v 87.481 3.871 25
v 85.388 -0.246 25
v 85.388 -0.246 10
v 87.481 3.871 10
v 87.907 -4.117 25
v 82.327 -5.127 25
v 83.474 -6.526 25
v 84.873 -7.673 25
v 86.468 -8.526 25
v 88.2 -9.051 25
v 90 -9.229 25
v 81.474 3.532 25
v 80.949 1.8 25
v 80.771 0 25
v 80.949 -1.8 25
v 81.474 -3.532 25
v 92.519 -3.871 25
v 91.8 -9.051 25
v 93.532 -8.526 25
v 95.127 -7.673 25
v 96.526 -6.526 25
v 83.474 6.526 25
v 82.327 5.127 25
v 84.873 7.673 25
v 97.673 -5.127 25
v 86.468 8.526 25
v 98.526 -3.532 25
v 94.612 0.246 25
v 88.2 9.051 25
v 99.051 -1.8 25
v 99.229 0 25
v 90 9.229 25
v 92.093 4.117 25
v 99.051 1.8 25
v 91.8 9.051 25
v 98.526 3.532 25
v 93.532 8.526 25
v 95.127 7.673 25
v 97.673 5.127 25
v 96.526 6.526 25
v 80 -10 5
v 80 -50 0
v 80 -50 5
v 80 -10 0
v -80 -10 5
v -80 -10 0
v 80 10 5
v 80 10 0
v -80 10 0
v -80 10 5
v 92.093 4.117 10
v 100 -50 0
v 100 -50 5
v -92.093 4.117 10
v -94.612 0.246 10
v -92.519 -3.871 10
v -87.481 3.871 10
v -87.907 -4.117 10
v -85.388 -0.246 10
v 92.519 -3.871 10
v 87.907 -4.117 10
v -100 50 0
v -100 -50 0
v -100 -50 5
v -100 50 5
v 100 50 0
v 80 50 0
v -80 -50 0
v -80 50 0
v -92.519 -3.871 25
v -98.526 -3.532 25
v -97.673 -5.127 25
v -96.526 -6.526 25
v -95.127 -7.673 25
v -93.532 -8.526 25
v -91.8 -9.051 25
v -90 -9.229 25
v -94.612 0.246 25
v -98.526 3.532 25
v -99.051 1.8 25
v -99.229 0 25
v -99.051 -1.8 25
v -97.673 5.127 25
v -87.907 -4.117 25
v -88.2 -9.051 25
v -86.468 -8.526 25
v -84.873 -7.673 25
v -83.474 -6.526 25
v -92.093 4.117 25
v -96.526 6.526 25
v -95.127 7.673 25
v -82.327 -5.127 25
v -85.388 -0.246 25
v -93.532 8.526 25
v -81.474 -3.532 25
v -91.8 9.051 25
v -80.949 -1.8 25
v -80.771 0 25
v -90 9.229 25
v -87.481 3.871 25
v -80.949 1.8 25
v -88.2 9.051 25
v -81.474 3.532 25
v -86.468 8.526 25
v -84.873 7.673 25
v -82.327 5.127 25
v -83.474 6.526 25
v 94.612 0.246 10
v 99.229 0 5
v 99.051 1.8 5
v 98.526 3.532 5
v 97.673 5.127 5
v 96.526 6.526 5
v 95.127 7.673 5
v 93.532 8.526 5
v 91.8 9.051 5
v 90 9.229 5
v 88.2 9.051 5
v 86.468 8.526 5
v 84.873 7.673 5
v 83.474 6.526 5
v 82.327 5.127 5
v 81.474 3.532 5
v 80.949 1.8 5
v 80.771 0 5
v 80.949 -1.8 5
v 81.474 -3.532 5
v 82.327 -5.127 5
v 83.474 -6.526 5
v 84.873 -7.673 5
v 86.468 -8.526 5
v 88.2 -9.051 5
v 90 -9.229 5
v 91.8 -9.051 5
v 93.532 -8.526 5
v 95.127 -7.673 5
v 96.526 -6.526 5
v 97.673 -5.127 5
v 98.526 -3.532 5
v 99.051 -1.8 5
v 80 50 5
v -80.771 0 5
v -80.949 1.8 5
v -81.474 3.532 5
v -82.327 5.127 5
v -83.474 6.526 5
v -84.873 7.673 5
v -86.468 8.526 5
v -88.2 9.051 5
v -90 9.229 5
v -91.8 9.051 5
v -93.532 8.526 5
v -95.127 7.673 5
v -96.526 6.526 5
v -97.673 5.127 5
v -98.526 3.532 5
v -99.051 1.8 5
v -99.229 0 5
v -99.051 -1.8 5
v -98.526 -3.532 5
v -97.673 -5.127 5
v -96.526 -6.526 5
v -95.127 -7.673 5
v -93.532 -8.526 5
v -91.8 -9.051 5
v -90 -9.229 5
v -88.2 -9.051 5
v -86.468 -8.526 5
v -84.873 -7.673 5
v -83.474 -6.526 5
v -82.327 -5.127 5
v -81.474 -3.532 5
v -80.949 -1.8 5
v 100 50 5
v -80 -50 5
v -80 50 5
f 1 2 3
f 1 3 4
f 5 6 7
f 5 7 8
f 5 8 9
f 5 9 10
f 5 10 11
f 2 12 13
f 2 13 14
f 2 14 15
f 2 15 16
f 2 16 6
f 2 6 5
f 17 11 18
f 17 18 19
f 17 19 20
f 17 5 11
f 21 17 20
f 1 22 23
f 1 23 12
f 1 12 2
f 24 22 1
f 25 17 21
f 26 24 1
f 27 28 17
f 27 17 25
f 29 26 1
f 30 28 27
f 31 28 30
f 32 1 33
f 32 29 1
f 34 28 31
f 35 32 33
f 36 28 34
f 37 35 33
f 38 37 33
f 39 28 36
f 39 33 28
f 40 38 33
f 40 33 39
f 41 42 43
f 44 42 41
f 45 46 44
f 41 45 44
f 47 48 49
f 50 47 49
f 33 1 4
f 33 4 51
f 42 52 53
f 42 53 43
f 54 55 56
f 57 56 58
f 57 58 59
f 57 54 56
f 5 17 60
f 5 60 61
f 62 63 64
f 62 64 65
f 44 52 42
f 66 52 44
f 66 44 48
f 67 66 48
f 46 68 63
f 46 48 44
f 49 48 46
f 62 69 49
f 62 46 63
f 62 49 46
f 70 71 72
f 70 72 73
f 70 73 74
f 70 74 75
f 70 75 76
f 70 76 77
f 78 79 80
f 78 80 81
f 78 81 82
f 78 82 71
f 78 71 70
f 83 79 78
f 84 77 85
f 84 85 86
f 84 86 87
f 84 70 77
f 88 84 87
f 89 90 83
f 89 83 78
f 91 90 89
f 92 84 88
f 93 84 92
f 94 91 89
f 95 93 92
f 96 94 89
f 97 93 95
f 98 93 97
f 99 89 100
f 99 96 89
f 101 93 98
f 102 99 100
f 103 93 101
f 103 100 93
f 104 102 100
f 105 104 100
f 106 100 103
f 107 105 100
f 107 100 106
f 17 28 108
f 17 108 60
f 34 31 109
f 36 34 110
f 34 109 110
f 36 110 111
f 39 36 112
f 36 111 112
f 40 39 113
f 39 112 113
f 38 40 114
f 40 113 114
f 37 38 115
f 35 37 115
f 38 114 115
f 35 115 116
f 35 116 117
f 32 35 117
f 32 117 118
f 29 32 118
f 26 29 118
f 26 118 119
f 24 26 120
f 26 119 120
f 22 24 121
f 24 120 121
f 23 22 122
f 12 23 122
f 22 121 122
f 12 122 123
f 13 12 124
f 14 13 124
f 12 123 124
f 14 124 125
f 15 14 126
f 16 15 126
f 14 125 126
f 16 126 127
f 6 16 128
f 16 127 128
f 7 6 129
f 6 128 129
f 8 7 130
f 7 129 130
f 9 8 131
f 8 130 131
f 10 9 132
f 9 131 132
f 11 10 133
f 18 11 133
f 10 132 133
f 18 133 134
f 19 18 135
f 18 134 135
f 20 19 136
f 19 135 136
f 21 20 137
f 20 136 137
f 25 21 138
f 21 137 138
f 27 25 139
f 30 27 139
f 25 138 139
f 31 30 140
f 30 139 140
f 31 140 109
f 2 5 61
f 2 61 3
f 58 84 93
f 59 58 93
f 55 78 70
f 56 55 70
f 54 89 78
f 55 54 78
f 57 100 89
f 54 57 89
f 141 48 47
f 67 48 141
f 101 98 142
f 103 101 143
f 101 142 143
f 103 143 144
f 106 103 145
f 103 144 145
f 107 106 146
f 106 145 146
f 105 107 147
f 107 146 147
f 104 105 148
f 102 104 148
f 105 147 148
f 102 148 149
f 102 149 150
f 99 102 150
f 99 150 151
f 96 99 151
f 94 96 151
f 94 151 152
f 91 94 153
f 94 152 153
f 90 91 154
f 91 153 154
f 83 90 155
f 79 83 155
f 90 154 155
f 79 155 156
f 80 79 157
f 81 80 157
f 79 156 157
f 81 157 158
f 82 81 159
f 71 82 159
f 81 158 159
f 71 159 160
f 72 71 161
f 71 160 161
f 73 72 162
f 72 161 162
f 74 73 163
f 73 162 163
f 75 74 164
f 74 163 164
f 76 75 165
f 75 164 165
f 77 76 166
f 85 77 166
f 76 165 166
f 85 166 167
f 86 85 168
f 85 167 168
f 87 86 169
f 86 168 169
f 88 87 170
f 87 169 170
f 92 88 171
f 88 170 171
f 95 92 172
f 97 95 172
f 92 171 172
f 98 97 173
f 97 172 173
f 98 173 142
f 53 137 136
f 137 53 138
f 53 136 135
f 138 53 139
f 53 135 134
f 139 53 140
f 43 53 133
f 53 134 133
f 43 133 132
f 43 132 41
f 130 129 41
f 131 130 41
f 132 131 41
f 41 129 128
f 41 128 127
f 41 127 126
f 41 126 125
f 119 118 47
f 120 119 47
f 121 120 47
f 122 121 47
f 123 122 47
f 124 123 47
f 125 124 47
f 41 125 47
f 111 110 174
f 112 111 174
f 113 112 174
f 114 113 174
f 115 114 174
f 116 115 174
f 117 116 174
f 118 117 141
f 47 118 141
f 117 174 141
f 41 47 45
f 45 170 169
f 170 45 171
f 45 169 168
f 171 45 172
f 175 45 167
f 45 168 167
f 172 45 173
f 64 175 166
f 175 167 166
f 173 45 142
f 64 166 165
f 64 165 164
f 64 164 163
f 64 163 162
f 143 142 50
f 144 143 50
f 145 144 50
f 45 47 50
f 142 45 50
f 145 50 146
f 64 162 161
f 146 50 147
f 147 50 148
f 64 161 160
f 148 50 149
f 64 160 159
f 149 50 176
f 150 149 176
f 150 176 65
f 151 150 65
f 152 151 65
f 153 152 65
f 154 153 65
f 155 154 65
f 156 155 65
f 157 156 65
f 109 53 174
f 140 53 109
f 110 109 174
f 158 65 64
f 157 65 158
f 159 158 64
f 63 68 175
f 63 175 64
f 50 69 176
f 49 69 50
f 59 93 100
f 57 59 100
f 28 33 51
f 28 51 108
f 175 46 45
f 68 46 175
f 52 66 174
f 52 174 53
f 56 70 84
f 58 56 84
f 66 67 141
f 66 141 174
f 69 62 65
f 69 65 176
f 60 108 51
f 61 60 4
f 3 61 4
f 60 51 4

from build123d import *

# Parameters (mm, degrees)
PAD_DEPTH    = 5
SKETCH002_R  = 9.228742
PAD001_DEPTH = 20
POCKET_DEPTH = 15


with BuildPart() as part:
    # Sketch001 → Pad (new body)
    with BuildSketch(Plane.XY):
        Polygon((0, 10), (80, 10), (80, 50), (100, 50), (100, -50), (80, -50), (80, -10), (0, -10), (-80, -10), (-80, -50), (-100, -50), (-100, 50), (-80, 50), (-80, 10), align=None)
    extrude(amount=PAD_DEPTH)

    # Sketch002 → Pad001 (new body)
    with BuildSketch(Plane.XY.offset(5)):
        with Locations((90, 0)):
            Circle(SKETCH002_R)
        with Locations((-90, 0)):
            Circle(SKETCH002_R)
    extrude(amount=PAD001_DEPTH)

    # Sketch003 → Pocket (cut)
    with BuildSketch(Plane.XY.offset(25)):
        Polygon((-87.480573, 3.871152), (-92.092803, 4.117464), (-94.61223, 0.246312), (-92.519427, -3.871152), (-87.907197, -4.117464), (-85.38777, -0.246312), align=None)
    pocket = extrude(amount=-POCKET_DEPTH, mode=Mode.SUBTRACT)

    # Mirrored: Pocket across Sketch003 V_Axis
    add(pocket.mirror(Plane(origin=(0, 0, 25), x_dir=(0, 0, 1), z_dir=(1, 0, 0))), mode=Mode.SUBTRACT)


solid = part.part
